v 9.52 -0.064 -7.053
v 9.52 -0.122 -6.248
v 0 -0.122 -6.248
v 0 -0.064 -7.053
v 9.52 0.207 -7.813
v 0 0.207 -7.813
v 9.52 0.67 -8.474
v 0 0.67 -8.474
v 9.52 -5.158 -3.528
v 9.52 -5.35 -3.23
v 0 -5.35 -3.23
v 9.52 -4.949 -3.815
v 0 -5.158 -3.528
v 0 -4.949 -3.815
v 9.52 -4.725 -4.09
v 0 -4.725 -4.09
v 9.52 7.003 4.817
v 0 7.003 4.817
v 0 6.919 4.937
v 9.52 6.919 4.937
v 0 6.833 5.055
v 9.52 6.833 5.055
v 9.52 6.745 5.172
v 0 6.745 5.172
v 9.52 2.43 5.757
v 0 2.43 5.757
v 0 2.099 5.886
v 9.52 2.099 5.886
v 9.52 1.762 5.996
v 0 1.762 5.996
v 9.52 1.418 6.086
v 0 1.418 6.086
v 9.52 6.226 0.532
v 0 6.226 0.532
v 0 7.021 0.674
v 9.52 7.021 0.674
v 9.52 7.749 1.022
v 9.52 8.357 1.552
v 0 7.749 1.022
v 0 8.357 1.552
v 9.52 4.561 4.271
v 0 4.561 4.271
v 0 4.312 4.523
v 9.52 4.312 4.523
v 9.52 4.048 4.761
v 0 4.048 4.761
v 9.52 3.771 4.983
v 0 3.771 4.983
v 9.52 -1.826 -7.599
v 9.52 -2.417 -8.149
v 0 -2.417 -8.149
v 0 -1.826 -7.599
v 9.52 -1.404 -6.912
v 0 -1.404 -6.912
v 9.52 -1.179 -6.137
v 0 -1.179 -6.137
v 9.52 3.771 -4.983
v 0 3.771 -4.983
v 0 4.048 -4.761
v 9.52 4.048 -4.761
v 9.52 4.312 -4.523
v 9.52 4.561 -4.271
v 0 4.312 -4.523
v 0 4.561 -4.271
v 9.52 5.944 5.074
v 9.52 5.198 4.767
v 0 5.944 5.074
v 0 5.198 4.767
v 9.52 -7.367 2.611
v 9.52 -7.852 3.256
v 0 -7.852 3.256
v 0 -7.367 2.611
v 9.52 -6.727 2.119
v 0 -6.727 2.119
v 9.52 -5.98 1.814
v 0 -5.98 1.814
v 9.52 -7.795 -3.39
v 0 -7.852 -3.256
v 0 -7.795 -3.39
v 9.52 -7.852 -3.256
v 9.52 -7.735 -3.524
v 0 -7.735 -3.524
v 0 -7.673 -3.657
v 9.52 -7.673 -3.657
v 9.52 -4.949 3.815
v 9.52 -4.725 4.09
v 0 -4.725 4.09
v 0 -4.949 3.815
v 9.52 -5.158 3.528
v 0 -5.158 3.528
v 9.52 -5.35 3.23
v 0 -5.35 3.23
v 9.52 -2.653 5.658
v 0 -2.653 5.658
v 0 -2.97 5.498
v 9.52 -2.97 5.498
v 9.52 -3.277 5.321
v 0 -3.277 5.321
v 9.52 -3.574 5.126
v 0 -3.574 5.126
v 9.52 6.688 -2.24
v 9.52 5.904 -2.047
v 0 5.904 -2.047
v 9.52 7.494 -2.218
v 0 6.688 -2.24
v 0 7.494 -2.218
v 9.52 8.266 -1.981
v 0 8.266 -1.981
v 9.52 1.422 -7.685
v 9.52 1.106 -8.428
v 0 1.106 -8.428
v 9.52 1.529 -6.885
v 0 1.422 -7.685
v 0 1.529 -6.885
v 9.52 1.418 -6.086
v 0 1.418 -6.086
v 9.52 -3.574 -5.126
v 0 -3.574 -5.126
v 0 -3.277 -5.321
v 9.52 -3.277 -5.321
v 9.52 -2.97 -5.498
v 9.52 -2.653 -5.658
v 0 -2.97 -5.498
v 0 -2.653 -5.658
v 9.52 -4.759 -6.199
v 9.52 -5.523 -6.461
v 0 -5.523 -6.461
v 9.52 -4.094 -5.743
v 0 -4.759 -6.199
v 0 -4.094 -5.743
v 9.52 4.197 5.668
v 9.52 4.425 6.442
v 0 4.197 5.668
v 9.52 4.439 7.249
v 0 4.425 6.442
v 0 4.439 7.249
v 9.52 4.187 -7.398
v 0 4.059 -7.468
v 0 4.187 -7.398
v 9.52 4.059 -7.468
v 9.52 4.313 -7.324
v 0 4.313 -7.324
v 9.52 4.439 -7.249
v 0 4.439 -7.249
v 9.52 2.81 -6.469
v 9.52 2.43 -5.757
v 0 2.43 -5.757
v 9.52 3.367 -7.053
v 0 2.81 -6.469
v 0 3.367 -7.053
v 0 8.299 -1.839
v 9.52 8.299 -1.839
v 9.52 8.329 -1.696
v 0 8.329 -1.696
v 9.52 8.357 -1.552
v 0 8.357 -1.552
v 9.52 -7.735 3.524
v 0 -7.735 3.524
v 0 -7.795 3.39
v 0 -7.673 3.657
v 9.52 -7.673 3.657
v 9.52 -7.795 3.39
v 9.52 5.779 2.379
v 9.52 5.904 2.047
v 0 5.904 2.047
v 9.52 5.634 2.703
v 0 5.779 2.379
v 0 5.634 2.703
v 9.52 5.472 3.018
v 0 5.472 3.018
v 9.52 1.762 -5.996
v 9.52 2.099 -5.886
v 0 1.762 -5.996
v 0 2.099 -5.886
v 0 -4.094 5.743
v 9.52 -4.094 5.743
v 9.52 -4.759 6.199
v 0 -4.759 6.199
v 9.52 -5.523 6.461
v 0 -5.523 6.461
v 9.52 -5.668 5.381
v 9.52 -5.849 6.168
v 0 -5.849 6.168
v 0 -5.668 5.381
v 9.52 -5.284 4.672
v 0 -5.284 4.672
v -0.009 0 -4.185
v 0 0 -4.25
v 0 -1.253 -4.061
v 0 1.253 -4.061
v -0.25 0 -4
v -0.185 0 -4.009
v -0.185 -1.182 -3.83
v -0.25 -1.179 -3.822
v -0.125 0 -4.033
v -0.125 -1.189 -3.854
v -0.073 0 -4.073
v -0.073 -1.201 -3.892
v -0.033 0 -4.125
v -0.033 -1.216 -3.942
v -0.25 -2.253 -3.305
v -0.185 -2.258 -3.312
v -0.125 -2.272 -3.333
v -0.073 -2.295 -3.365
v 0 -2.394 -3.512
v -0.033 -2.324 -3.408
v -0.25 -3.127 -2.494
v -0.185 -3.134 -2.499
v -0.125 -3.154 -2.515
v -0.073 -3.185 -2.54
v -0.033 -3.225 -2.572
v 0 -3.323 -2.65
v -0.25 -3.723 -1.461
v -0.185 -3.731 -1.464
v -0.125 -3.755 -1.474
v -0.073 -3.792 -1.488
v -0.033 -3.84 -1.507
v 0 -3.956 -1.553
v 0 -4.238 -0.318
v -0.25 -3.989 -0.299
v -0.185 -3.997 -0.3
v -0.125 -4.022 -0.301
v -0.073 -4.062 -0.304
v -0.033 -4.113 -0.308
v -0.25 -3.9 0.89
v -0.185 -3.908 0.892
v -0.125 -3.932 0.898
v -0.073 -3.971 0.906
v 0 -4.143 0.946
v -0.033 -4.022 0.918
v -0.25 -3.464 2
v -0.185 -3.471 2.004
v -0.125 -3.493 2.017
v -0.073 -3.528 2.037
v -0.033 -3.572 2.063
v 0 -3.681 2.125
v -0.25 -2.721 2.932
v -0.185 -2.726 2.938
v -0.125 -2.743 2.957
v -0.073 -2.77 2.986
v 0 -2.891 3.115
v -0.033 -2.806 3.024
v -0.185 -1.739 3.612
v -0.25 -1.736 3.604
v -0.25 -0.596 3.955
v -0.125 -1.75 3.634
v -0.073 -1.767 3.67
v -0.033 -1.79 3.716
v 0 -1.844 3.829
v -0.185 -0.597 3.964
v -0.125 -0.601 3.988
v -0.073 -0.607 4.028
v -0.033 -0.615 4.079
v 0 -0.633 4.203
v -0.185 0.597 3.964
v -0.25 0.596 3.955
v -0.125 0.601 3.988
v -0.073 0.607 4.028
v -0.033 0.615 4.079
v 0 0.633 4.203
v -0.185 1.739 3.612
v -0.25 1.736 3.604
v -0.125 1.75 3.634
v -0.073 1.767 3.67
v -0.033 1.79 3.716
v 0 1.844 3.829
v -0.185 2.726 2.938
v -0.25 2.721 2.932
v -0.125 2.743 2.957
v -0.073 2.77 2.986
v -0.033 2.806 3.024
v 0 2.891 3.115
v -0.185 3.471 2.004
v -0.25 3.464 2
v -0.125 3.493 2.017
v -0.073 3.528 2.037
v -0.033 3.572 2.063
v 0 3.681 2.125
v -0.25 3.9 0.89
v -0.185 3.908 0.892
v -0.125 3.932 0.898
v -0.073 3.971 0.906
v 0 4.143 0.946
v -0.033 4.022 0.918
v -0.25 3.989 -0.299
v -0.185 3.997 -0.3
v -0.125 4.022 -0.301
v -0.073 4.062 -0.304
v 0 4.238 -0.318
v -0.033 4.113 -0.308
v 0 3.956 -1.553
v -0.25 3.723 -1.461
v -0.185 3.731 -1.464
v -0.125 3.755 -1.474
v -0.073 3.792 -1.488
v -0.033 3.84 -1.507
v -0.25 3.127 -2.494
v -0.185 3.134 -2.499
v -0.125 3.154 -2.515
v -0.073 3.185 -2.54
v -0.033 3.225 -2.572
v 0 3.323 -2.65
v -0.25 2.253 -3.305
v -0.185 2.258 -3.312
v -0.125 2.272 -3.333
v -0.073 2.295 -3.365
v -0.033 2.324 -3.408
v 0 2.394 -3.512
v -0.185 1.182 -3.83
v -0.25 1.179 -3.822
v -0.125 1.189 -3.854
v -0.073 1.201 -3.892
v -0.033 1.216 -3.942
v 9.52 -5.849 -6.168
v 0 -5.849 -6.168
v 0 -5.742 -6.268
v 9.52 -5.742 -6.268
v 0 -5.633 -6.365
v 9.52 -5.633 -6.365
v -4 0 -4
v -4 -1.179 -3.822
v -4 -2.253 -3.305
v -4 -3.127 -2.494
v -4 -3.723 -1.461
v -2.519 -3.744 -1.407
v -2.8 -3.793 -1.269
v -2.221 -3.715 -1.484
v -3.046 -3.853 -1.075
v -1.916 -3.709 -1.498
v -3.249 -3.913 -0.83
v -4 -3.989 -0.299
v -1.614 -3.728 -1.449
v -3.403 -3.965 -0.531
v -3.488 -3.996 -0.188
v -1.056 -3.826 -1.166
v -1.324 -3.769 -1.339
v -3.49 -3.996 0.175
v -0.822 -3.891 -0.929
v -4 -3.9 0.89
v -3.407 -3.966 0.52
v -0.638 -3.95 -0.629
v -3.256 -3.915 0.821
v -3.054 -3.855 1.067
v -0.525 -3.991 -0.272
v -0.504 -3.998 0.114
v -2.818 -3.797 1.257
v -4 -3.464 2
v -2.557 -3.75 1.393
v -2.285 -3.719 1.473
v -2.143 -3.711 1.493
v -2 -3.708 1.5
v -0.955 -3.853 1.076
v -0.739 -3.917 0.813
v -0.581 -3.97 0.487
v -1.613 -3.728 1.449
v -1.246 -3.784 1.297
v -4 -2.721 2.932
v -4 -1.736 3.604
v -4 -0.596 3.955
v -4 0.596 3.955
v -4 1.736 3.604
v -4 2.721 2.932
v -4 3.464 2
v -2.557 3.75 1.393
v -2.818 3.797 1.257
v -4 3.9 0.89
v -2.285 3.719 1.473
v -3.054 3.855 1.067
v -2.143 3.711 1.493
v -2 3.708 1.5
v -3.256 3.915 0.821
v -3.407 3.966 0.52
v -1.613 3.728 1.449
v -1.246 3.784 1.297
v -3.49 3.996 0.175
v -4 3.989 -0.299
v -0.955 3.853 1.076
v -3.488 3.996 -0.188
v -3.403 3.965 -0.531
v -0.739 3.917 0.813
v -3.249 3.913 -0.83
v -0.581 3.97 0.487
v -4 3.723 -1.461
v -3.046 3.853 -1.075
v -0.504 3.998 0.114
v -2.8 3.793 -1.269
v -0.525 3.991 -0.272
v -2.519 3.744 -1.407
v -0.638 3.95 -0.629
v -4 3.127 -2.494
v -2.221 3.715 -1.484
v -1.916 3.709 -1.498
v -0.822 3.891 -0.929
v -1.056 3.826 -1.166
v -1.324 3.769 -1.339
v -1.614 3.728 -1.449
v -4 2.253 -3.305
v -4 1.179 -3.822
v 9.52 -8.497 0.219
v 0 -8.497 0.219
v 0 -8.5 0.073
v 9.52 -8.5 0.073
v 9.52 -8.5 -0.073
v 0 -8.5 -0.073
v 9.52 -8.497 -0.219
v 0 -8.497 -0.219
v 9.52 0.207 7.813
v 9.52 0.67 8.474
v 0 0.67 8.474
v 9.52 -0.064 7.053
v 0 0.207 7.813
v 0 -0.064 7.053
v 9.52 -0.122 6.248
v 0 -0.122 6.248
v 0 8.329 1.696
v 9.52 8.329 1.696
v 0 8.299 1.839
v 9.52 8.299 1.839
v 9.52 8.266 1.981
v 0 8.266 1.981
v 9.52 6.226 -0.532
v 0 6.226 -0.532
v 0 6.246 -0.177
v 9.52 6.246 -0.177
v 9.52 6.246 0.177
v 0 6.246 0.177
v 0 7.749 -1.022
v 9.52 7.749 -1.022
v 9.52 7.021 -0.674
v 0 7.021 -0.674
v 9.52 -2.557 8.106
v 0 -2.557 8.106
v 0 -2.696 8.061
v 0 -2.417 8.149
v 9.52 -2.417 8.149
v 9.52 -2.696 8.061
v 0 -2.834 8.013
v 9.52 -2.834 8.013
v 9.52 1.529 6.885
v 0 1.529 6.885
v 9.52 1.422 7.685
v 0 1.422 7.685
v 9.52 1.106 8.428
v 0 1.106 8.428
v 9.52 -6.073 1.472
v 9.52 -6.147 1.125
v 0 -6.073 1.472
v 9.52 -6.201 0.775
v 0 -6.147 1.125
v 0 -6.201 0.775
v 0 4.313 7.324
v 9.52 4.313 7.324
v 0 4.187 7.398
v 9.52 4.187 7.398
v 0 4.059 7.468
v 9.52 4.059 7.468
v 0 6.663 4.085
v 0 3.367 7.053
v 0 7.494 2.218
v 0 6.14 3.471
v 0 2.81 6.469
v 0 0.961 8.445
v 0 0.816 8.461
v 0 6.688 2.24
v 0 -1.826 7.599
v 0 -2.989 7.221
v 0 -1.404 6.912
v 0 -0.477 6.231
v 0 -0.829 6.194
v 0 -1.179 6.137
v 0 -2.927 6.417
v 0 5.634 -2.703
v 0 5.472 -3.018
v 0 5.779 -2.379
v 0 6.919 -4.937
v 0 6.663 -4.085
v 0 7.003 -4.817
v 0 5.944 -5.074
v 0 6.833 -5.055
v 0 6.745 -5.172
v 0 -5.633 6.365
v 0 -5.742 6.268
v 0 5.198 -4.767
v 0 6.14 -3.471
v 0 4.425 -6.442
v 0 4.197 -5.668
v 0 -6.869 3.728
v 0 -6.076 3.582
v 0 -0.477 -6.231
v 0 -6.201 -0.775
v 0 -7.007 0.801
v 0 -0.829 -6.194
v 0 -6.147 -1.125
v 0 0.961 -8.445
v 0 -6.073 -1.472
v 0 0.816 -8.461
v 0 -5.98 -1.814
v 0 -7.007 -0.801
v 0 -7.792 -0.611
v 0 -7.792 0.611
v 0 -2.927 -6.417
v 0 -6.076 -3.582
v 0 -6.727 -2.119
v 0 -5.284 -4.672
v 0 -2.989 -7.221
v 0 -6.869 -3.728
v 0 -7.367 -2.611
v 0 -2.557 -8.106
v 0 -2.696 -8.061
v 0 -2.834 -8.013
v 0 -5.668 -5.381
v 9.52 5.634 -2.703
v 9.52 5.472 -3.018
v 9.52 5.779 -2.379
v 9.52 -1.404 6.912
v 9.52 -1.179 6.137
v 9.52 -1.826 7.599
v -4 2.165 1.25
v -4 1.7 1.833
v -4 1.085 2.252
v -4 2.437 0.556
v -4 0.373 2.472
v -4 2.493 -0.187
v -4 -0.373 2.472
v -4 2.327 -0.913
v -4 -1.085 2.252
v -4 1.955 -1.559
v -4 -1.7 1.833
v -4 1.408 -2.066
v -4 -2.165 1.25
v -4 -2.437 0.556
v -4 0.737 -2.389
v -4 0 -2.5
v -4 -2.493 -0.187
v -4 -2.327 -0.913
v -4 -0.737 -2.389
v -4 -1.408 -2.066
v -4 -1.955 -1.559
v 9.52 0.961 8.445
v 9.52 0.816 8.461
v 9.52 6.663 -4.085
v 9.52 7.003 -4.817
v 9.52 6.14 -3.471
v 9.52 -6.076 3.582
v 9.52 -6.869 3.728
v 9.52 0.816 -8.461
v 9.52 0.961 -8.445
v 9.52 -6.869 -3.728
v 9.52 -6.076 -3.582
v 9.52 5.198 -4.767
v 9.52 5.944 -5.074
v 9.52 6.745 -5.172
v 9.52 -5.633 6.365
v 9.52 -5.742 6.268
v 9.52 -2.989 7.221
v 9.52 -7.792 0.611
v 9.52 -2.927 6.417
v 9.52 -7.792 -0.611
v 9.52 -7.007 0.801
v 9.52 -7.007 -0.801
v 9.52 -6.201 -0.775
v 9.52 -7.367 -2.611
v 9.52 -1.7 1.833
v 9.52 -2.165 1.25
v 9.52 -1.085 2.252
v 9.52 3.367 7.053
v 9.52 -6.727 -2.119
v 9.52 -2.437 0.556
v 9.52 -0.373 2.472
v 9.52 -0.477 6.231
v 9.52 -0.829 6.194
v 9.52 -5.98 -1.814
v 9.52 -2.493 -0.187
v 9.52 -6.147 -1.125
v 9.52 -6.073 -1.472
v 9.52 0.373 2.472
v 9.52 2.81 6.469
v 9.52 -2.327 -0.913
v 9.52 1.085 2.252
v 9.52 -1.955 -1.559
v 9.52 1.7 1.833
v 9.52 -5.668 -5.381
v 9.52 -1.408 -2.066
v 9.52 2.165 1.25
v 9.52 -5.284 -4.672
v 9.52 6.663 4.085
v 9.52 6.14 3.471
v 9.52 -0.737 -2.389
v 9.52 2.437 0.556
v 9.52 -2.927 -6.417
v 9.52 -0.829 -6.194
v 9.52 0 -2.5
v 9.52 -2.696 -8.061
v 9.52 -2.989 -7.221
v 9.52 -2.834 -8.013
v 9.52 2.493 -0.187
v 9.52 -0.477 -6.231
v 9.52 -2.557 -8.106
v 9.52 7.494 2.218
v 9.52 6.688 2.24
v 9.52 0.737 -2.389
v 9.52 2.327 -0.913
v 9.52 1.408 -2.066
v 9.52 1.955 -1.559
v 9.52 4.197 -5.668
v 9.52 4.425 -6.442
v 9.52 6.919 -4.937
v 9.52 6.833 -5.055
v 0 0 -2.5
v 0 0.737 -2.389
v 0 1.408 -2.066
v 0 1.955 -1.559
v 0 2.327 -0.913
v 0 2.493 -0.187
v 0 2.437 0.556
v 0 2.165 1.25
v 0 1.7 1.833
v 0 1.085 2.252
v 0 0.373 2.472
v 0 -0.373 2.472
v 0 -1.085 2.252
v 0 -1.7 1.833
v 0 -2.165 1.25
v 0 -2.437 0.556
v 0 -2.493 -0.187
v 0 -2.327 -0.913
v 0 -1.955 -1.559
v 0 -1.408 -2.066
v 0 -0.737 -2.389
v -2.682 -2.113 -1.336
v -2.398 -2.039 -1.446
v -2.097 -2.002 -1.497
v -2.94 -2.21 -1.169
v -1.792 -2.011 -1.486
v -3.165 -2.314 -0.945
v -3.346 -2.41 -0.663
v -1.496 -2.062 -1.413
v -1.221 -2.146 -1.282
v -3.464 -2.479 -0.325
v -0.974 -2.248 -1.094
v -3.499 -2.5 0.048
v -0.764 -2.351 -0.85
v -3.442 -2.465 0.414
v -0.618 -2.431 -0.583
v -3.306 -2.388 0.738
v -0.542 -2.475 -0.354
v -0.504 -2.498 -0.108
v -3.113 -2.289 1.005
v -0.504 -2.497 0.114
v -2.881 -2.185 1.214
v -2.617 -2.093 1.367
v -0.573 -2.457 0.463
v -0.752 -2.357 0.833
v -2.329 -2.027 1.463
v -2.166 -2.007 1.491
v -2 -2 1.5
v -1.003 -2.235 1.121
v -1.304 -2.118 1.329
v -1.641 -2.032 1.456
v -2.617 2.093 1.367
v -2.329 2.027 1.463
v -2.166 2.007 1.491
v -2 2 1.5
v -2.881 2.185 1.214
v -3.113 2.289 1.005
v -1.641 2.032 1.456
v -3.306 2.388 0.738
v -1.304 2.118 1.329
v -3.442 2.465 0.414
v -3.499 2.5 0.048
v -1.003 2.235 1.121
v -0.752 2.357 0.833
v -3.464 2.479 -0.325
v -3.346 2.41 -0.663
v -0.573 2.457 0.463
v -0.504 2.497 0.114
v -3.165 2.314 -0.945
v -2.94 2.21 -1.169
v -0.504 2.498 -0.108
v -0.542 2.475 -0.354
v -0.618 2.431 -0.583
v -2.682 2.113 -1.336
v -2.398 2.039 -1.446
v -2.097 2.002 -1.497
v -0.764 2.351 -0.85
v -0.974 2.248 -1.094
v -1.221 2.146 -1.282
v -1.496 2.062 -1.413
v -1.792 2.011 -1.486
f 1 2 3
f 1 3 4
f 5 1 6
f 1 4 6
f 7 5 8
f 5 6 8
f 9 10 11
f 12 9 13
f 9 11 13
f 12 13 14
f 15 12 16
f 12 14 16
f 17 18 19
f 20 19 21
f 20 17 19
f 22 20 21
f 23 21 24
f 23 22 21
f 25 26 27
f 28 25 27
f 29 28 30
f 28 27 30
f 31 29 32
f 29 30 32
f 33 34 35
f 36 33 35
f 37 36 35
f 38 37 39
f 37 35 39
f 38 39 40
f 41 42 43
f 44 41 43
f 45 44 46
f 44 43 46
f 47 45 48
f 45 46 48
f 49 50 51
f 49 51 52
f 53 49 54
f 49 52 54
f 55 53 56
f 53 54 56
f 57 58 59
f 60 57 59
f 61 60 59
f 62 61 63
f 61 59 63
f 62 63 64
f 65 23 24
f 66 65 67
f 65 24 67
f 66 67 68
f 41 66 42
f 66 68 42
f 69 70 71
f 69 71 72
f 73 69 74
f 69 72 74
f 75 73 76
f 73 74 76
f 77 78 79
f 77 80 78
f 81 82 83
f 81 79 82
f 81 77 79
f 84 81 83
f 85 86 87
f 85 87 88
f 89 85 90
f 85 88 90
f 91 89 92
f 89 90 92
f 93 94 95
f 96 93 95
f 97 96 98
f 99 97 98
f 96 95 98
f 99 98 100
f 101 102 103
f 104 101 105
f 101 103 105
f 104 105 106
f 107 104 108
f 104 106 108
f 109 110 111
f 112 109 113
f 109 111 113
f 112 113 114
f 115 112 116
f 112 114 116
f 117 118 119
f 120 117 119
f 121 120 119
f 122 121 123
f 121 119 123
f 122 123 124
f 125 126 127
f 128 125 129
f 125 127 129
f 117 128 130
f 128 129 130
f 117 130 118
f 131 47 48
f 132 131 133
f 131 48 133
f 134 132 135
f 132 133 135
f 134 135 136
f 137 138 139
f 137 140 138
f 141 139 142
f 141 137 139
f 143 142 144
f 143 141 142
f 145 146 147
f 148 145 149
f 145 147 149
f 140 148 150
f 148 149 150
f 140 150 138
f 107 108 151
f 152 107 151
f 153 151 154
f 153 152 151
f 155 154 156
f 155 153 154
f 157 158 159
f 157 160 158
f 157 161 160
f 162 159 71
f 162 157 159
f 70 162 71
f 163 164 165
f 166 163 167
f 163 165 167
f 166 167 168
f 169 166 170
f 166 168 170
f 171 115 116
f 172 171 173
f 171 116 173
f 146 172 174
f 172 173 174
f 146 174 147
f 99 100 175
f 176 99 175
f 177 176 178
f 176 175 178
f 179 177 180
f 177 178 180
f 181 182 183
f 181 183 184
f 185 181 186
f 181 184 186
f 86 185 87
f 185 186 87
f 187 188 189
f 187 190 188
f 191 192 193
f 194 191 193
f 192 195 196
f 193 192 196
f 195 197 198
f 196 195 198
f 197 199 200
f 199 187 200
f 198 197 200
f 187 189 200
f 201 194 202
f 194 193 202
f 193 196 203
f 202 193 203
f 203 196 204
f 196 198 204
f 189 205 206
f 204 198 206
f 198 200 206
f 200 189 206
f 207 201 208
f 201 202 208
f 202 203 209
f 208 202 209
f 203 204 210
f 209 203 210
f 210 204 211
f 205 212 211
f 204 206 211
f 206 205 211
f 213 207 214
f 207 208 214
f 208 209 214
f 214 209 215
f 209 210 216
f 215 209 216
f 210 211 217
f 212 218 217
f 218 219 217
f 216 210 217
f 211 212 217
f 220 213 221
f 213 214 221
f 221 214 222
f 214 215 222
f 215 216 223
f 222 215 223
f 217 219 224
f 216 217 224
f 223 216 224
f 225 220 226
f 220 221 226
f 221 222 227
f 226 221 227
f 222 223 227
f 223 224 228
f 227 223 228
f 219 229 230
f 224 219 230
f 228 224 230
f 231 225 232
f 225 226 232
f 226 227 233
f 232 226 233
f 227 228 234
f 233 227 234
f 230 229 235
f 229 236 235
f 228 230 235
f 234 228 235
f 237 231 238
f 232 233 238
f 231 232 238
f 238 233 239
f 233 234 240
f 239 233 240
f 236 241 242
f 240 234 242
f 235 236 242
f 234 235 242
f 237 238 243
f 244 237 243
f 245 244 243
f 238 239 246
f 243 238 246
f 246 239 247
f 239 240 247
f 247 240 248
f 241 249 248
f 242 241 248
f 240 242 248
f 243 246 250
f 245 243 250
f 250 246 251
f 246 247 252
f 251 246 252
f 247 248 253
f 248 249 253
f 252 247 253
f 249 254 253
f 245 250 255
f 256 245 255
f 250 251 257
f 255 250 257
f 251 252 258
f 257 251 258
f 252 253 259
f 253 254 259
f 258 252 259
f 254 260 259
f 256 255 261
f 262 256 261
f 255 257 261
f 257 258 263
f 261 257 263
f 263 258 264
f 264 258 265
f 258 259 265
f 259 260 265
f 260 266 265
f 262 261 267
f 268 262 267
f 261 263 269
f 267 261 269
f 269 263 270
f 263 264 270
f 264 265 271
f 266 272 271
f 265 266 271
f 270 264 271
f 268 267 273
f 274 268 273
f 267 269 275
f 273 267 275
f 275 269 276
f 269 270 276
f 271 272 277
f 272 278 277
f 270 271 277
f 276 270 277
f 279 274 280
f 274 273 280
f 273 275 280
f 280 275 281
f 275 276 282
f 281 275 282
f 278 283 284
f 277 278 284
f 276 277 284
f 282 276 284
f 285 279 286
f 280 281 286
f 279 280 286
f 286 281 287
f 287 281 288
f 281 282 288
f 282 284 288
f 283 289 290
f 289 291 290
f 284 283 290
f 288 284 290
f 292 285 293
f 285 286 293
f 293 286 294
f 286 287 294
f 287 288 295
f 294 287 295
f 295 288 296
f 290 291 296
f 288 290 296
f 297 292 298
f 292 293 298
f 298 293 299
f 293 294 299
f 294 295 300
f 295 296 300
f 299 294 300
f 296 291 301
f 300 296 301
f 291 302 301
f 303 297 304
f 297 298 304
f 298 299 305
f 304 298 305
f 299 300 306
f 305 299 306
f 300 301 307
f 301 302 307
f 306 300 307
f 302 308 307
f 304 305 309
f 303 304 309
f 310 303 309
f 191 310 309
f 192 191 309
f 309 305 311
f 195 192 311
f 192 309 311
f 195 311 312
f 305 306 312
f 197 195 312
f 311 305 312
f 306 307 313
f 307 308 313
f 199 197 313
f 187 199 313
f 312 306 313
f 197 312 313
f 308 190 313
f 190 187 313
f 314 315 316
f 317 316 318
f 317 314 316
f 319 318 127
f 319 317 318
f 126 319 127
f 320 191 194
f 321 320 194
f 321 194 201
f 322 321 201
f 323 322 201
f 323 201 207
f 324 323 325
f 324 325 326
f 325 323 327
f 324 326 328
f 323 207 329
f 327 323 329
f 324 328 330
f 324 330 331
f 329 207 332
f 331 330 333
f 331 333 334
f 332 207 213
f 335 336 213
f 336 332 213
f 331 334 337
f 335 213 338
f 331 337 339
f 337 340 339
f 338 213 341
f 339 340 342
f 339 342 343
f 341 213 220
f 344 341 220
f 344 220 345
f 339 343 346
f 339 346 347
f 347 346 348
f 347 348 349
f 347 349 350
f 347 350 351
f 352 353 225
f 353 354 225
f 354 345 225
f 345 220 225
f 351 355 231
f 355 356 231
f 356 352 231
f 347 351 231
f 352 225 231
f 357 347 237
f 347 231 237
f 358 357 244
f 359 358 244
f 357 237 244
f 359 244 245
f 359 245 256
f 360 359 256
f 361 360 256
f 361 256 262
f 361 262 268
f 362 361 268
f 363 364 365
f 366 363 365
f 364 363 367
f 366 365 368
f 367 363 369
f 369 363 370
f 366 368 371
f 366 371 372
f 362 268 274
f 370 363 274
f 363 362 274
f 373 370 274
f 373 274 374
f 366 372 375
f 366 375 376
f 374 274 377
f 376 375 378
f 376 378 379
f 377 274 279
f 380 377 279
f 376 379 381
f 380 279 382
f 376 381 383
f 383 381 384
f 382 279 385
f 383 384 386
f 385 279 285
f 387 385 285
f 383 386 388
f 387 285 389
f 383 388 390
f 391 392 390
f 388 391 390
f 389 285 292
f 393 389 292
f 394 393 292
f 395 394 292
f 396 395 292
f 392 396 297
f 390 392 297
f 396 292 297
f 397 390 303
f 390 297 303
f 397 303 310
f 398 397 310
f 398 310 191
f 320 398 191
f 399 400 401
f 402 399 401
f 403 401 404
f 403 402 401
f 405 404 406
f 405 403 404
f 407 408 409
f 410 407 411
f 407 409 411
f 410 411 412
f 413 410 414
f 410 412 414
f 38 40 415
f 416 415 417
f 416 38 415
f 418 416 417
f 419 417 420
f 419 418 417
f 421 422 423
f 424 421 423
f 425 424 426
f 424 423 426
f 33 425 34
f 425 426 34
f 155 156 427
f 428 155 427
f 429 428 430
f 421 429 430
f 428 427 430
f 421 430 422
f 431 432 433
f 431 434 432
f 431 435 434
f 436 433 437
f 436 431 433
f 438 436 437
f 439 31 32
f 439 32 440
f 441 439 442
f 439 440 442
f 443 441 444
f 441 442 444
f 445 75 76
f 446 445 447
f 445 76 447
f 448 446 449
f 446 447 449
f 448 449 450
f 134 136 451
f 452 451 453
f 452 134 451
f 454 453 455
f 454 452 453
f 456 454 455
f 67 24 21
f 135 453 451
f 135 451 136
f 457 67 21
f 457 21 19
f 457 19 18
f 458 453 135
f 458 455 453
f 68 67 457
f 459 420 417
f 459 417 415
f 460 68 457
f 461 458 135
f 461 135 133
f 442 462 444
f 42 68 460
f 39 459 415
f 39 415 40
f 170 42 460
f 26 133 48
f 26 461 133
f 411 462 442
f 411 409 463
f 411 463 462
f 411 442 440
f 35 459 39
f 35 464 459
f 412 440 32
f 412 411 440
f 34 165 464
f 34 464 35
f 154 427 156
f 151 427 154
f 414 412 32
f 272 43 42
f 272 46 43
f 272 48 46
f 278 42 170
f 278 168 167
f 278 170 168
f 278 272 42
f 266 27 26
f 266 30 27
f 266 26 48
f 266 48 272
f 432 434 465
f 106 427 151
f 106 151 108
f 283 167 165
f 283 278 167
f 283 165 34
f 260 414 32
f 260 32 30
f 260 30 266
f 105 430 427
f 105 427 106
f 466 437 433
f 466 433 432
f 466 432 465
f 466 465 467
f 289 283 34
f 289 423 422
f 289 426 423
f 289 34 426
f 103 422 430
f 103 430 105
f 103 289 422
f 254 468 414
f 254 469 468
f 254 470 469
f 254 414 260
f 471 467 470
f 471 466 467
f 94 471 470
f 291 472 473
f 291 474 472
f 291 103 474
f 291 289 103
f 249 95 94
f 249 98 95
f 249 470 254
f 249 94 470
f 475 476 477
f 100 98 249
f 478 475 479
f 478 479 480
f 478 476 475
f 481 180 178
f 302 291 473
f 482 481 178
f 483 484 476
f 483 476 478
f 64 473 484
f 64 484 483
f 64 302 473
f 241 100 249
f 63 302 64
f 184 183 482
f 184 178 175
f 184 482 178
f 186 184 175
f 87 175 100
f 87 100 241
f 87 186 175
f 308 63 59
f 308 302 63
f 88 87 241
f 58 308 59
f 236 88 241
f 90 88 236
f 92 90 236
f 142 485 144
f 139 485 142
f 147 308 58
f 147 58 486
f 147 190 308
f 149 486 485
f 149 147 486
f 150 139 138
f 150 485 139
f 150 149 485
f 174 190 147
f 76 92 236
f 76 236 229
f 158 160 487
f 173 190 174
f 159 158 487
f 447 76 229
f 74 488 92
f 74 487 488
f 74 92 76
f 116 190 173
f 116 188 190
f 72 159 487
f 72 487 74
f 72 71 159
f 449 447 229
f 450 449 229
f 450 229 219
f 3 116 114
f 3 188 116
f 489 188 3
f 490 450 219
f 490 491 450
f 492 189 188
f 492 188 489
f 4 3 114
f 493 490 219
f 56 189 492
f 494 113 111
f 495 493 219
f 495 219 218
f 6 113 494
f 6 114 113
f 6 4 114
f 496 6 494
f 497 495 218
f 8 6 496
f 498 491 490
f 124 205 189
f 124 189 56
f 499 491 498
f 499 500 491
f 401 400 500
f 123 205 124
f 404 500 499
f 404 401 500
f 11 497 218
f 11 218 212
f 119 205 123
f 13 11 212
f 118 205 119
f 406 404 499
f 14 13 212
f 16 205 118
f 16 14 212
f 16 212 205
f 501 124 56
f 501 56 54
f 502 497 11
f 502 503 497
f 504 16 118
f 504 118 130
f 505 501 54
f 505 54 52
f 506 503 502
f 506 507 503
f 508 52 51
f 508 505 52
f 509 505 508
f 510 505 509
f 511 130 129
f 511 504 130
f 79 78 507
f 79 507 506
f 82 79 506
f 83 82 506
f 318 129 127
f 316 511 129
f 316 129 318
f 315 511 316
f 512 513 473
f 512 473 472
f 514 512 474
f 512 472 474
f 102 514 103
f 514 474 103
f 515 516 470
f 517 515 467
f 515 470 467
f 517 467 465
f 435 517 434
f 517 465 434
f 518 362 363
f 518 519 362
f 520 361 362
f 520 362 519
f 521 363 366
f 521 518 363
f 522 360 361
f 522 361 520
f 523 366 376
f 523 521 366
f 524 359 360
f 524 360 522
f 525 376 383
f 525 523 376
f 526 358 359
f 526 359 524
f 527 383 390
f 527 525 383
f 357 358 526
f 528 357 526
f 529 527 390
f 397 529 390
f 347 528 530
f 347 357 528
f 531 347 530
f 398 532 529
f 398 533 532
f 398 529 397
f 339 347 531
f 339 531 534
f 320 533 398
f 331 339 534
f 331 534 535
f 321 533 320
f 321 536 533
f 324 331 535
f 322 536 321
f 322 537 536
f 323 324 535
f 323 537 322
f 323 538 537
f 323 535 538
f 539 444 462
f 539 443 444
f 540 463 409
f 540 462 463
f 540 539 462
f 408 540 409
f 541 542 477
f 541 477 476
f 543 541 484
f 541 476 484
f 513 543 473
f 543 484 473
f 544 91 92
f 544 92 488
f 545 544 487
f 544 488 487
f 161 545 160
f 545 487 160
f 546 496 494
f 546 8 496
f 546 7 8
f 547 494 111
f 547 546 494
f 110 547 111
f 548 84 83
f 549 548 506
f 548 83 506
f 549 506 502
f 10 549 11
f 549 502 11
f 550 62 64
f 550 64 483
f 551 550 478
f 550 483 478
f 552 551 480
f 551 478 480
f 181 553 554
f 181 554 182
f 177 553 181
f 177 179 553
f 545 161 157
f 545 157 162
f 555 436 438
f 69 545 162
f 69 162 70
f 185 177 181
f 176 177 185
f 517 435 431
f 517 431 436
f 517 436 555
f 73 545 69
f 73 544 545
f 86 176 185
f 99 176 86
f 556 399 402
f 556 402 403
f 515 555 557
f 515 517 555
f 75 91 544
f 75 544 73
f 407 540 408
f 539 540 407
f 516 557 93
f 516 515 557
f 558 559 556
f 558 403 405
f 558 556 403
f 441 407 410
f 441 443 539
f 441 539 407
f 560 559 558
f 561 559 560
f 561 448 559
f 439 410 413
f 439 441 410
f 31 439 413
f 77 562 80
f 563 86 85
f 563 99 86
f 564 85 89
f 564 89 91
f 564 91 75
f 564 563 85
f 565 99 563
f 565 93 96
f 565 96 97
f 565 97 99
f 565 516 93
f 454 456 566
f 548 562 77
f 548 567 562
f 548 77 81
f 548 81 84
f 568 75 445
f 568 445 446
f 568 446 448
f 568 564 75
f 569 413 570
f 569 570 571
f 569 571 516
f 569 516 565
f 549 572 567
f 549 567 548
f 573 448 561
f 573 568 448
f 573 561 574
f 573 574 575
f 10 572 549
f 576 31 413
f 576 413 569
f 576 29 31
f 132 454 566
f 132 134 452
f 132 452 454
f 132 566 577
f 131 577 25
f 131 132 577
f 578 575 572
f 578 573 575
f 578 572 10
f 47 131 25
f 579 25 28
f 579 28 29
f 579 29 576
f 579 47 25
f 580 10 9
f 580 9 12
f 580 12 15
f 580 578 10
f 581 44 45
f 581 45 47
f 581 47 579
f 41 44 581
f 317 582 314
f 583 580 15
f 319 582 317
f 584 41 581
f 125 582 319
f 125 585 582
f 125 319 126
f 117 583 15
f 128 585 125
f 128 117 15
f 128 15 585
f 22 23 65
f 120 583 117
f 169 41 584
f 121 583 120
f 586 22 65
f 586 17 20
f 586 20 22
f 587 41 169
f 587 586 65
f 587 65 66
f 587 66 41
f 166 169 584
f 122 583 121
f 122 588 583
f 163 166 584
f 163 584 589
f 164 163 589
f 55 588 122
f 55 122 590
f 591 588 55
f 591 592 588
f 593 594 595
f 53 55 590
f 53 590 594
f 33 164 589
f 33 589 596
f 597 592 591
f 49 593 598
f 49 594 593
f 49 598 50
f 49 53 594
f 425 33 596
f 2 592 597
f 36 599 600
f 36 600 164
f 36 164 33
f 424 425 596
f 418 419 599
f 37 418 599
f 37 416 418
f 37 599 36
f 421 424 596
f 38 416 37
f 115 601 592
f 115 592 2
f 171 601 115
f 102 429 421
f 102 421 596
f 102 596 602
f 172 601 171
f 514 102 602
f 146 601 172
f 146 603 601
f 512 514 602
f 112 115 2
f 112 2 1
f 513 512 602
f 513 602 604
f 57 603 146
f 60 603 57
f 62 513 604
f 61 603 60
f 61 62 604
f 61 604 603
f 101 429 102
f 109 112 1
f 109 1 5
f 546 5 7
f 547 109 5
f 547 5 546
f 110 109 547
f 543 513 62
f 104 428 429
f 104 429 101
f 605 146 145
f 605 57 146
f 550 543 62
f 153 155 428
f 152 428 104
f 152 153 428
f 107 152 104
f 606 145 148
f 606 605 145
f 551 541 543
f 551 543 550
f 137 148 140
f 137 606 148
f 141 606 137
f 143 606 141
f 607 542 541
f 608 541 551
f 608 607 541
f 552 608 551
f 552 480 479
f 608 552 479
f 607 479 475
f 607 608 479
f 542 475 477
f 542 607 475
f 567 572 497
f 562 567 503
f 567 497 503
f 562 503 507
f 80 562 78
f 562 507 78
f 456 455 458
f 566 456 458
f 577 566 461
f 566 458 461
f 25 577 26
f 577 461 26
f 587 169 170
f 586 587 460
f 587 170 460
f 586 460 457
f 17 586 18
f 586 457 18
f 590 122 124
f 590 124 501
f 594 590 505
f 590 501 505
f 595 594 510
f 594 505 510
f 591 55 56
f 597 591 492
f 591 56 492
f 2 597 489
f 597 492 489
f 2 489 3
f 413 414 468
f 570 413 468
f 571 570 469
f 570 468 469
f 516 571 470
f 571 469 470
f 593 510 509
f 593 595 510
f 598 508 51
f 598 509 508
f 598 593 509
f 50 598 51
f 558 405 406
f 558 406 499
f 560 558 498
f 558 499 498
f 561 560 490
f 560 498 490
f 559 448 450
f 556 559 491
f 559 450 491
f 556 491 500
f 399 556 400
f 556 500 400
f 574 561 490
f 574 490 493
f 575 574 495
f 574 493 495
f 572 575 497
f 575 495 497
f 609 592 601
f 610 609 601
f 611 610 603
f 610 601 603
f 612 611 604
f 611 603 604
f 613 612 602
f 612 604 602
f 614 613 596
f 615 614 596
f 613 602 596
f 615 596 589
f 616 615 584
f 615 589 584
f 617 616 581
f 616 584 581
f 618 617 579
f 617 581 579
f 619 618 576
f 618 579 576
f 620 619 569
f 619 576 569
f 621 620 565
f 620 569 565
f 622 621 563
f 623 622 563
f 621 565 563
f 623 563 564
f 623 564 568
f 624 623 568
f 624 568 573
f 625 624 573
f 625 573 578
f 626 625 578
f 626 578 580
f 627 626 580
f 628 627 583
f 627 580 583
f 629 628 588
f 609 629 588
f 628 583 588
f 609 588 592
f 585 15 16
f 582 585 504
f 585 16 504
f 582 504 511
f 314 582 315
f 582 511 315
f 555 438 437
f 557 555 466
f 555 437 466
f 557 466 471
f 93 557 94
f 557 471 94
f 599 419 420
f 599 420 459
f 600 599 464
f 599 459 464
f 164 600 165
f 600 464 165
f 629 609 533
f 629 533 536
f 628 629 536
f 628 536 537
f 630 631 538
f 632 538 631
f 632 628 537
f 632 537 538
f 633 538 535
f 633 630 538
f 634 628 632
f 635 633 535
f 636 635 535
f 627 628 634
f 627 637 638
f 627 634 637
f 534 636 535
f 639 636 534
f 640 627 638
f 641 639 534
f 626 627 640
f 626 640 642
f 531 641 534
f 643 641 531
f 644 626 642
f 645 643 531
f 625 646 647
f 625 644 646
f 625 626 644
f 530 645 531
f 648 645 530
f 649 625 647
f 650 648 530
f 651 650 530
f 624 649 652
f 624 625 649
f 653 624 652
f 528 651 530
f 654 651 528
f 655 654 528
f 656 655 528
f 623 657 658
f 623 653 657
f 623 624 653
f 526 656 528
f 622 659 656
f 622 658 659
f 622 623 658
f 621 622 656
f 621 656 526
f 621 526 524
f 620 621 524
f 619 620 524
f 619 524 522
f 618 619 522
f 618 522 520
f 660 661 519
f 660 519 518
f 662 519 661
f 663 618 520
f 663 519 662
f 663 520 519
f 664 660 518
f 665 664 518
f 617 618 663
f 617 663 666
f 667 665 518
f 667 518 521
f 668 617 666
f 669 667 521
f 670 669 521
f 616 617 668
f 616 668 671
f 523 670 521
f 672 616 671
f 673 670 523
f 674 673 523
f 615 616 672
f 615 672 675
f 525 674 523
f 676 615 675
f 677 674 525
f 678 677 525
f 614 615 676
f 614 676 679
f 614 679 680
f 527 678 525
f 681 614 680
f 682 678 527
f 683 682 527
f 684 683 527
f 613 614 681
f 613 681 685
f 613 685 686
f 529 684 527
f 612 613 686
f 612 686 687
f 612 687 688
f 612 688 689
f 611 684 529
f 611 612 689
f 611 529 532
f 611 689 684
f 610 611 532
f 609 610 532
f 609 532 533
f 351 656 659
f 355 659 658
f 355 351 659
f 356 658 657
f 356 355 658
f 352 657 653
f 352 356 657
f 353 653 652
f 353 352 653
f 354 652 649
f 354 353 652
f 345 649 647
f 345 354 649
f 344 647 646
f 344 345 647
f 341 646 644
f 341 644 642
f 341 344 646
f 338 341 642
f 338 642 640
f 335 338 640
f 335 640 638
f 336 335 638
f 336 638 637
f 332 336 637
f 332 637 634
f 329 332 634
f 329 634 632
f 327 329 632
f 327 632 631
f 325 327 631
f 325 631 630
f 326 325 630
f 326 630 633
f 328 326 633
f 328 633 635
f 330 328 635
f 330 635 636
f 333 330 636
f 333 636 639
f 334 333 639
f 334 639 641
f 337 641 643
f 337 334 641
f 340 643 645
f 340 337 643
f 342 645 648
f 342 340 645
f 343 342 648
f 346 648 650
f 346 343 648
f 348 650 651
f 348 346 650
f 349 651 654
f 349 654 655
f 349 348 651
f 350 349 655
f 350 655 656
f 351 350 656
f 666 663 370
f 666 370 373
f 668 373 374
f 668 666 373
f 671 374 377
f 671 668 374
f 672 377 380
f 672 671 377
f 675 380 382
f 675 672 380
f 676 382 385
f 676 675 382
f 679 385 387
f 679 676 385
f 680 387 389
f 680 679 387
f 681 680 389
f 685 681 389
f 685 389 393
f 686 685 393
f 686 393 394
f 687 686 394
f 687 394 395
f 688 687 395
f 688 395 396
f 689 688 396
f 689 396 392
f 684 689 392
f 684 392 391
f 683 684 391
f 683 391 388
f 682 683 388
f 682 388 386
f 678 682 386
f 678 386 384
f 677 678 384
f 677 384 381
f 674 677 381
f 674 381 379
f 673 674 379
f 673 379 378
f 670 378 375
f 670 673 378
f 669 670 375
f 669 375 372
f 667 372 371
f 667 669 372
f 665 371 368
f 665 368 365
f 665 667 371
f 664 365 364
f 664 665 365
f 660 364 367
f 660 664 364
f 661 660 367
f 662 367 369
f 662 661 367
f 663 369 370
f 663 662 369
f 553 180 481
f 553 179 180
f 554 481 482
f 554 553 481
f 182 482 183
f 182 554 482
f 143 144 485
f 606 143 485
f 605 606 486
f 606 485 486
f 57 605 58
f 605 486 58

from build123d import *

# Parameters (mm, degrees)
BASPROSKE_W                = 12.7
BASPROSKE_H                = 8.5
TOOTHCUT_DEPTH             = 18.486852204
TEETHCUTS_COUNT            = 15
TEETHCUTS_ANGLE            = 336
BORSKE_R                   = 0.4
BORE_DEPTH                 = 50.0000508
CORTAR_EXTRUIR1_START      = -3.18
CORTAR_EXTRUIR1_DEPTH      = 3.18
CROQUIS4_R                 = 2.5
CORTAR_EXTRUIR2_DEPTH      = 9.52
CROQUIS5_R                 = 4
CROQUIS5_R_2               = 2.5
SALIENTE_EXTRUIR1_DEPTH    = 4
CORTAR_EXTRUIR3_DEPTH      = 16.319316842
CORTAR_EXTRUIR3_DEPTH_BACK = 16.319316842
CROQUIS6_R                 = 1.5
REDONDEO2_R                = 0.25


with BuildPart() as part:
    # BasProSke → Base-Revolve (revolve)
    with BuildSketch(Plane(origin=(0, 0, 0), x_dir=(1, 0, 0), z_dir=(0, 1, 0)), mode=Mode.PRIVATE) as base_revolve_sk:
        with Locations((6.35, 4.25)):
            Rectangle(BASPROSKE_W, BASPROSKE_H)
    revolve(base_revolve_sk.sketch.rotate(Axis((-10, 0, 0), (1, 0, 0)), 180), axis=Axis((-10, 0, 0), (1, 0, 0)))

    # TooCutSke → ToothCut (cut, through all)
    with BuildSketch(Plane(origin=(0, 0, 0), x_dir=(0, 0, -1), z_dir=(1, 0, 0))):
        with BuildLine():
            ThreePointArc((0.531576138, 6.226349477), (0, 6.249), (-0.531576138, 6.226349477))
            ThreePointArc((-0.531576138, 6.226349477), (-0.830301624, 7.411024729), (-1.576608494, 8.378350125))
            ThreePointArc((-1.576608494, 8.378350125), (0, 8.5254), (1.576608494, 8.378350125))
            ThreePointArc((1.576608494, 8.378350125), (0.830301624, 7.411024729), (0.531576138, 6.226349477))
        make_face()
    toothcut = extrude(amount=TOOTHCUT_DEPTH, mode=Mode.SUBTRACT)

    # TeethCuts: ToothCut ×15 about axis
    teethcuts_axis = Axis((-10, 0, 0), (1, 0, 0))
    for i in range(1, TEETHCUTS_COUNT):
        add(toothcut.rotate(teethcuts_axis, i * TEETHCUTS_ANGLE / (TEETHCUTS_COUNT - 1)), mode=Mode.SUBTRACT)

    # BorSke → Bore (cut, symmetric)
    with BuildSketch(Plane(origin=(0, 0, 0), x_dir=(0, 0, -1), z_dir=(1, 0, 0))):
        with Locations(Location((0, 0, 0), (0, 0, 180))):
            Circle(BORSKE_R)
    extrude(amount=BORE_DEPTH, both=True, mode=Mode.SUBTRACT)

    # Croquis2 → Cortar-Extruir1 (cut)
    with BuildSketch(Plane(origin=(12.7, 0, 0), x_dir=(0, 0, -1), z_dir=(1, 0, 0)).offset(CORTAR_EXTRUIR1_START)):
        with BuildLine():
            ThreePointArc((-8.473551116, 0.670023493), (-7.441942771, 0.04560728), (-6.24780572, -0.122166634))
            ThreePointArc((-6.24780572, -0.122166634), (-6.214767324, -0.653198367), (-6.136676046, -1.179494851))
            ThreePointArc((-6.136676046, -1.179494851), (-7.26983618, -1.591877556), (-8.149077977, -2.417132211))
            ThreePointArc((-8.149077977, -2.417132211), (-8.083980389, -2.626644452), (-8.013497238, -2.834406818))
            ThreePointArc((-8.013497238, -2.834406818), (-6.817103167, -2.985246497), (-5.657964889, -2.652816299))
            ThreePointArc((-5.657964889, -2.652816299), (-5.411792748, -3.1245), (-5.126388751, -3.573533178))
            ThreePointArc((-5.126388751, -3.573533178), (-5.993850886, -4.411161274), (-6.461416928, -5.522688773))
            ThreePointArc((-6.461416928, -5.522688773), (-6.316731017, -5.687610154), (-6.167836888, -5.84874244))
            ThreePointArc((-6.167836888, -5.84874244), (-5.013524493, -5.499924035), (-4.089810528, -4.724769925))
            ThreePointArc((-4.089810528, -4.724769925), (-3.673070042, -5.055547198), (-3.229702268, -5.349675154))
            ThreePointArc((-3.229702268, -5.349675154), (-3.681474322, -6.467715134), (-3.656518192, -7.673322273))
            ThreePointArc((-3.656518192, -7.673322273), (-3.457261466, -7.76513639), (-3.255701506, -7.851777359))
            ThreePointArc((-3.255701506, -7.851777359), (-2.343061889, -7.063614742), (-1.814490772, -5.979767908))
            ThreePointArc((-1.814490772, -5.979767908), (-1.299240156, -6.112444357), (-0.774570923, -6.200809696))
            ThreePointArc((-0.774570923, -6.200809696), (-0.732537403, -7.405942289), (-0.219374243, -8.497168643))
            ThreePointArc((-0.219374243, -8.497168643), (0, -8.5), (0.219374243, -8.497168643))
            ThreePointArc((0.219374243, -8.497168643), (0.732537403, -7.405942289), (0.774570923, -6.200809696))
            ThreePointArc((0.774570923, -6.200809696), (1.299240156, -6.112444357), (1.814490772, -5.979767908))
            ThreePointArc((1.814490772, -5.979767908), (2.343061889, -7.063614742), (3.255701506, -7.851777359))
            ThreePointArc((3.255701506, -7.851777359), (3.457261466, -7.76513639), (3.656518192, -7.673322273))
            ThreePointArc((3.656518192, -7.673322273), (3.681474322, -6.467715134), (3.229702268, -5.349675154))
            ThreePointArc((3.229702268, -5.349675154), (3.673070042, -5.055547198), (4.089810528, -4.724769925))
            ThreePointArc((4.089810528, -4.724769925), (5.013524493, -5.499924035), (6.167836888, -5.84874244))
            ThreePointArc((6.167836888, -5.84874244), (6.316731017, -5.687610154), (6.461416928, -5.522688773))
            ThreePointArc((6.461416928, -5.522688773), (5.993850886, -4.411161274), (5.126388751, -3.573533178))
            ThreePointArc((5.126388751, -3.573533178), (5.411792748, -3.1245), (5.657964889, -2.652816299))
            ThreePointArc((5.657964889, -2.652816299), (6.817103167, -2.985246497), (8.013497238, -2.834406818))
            ThreePointArc((8.013497238, -2.834406818), (8.083980389, -2.626644452), (8.149077977, -2.417132211))
            ThreePointArc((8.149077977, -2.417132211), (7.26983618, -1.591877556), (6.136676046, -1.179494851))
            ThreePointArc((6.136676046, -1.179494851), (6.214767324, -0.653198367), (6.24780572, -0.122166634))
            ThreePointArc((6.24780572, -0.122166634), (7.441942771, 0.04560728), (8.473551116, 0.670023493))
            ThreePointArc((8.473551116, 0.670023493), (8.453436111, 0.888491938), (8.427689411, 1.106368468))
            ThreePointArc((8.427689411, 1.106368468), (7.288800753, 1.502656253), (6.085876303, 1.418488851))
            ThreePointArc((6.085876303, 1.418488851), (5.94315217, 1.931047198), (5.757344182, 2.429606752))
            ThreePointArc((5.757344182, 2.429606752), (6.780002862, 3.068575145), (7.468451026, 4.058600654))
            ThreePointArc((7.468451026, 4.058600654), (7.361215932, 4.25), (7.249076783, 4.438567989))
            ThreePointArc((7.249076783, 4.438567989), (6.04746546, 4.337367144), (4.982773259, 3.771202944))
            ThreePointArc((4.982773259, 3.771202944), (4.643912014, 4.181397159), (4.271385532, 4.561279057))
            ThreePointArc((4.271385532, 4.561279057), (4.945738865, 5.560958489), (5.171987905, 6.745408891))
            ThreePointArc((5.171987905, 6.745408891), (4.996174644, 6.876644452), (4.817032924, 7.003298781))
            ThreePointArc((4.817032924, 7.003298781), (3.760468449, 6.422107853), (3.018103451, 5.471841788))
            ThreePointArc((3.018103451, 5.471841788), (2.541697283, 5.708745565), (2.046865518, 5.904264776))
            ThreePointArc((2.046865518, 5.904264776), (2.256311686, 7.091801591), (1.981241089, 8.265874651))
            ThreePointArc((1.981241089, 8.265874651), (1.767249372, 8.314254606), (1.55208031, 8.357095591))
            ThreePointArc((1.55208031, 8.357095591), (0.823252281, 7.396407771), (0.531576138, 6.226349477))
            ThreePointArc((0.531576138, 6.226349477), (0, 6.249), (-0.531576138, 6.226349477))
            ThreePointArc((-0.531576138, 6.226349477), (-0.823252281, 7.396407771), (-1.55208031, 8.357095591))
            ThreePointArc((-1.55208031, 8.357095591), (-1.767249372, 8.314254606), (-1.981241089, 8.265874651))
            ThreePointArc((-1.981241089, 8.265874651), (-2.256311686, 7.091801591), (-2.046865518, 5.904264776))
            ThreePointArc((-2.046865518, 5.904264776), (-2.541697283, 5.708745565), (-3.018103451, 5.471841788))
            ThreePointArc((-3.018103451, 5.471841788), (-3.760468449, 6.422107853), (-4.817032924, 7.003298781))
            ThreePointArc((-4.817032924, 7.003298781), (-4.996174644, 6.876644452), (-5.171987905, 6.745408891))
            ThreePointArc((-5.171987905, 6.745408891), (-4.945738865, 5.560958489), (-4.271385532, 4.561279057))
            ThreePointArc((-4.271385532, 4.561279057), (-4.643912014, 4.181397159), (-4.982773259, 3.771202944))
            ThreePointArc((-4.982773259, 3.771202944), (-6.04746546, 4.337367144), (-7.249076783, 4.438567989))
            ThreePointArc((-7.249076783, 4.438567989), (-7.361215932, 4.25), (-7.468451026, 4.058600654))
            ThreePointArc((-7.468451026, 4.058600654), (-6.780002862, 3.068575145), (-5.757344182, 2.429606752))
            ThreePointArc((-5.757344182, 2.429606752), (-5.94315217, 1.931047198), (-6.085876303, 1.418488851))
            ThreePointArc((-6.085876303, 1.418488851), (-7.288800753, 1.502656253), (-8.427689411, 1.106368468))
            ThreePointArc((-8.427689411, 1.106368468), (-8.453436111, 0.888491938), (-8.473551116, 0.670023493))
        make_face()
    extrude(amount=CORTAR_EXTRUIR1_DEPTH, mode=Mode.SUBTRACT)

    # Croquis4 → Cortar-Extruir2 (cut)
    with BuildSketch(Plane(origin=(9.52, 0, 0), x_dir=(0, 0, -1), z_dir=(1, 0, 0))):
        Circle(CROQUIS4_R)
    extrude(amount=-CORTAR_EXTRUIR2_DEPTH, mode=Mode.SUBTRACT)

    # Croquis5 → Saliente-Extruir1 (add)
    with BuildSketch(Plane.ZY):
        with Locations(Location((0, 0, 0), (0, 0, 180))):
            Circle(CROQUIS5_R)
        with Locations(Location((0, 0, 0), (0, 0, 180))):
            Circle(CROQUIS5_R_2, mode=Mode.SUBTRACT)
    extrude(amount=SALIENTE_EXTRUIR1_DEPTH)

    # Croquis6 → Cortar-Extruir3 (cut, two sides: drawn at the far end of the back side and taken through both)
    with BuildSketch(Plane(origin=(0, 0, 0), x_dir=(1, 0, 0), z_dir=(0, 1, 0)).offset(-CORTAR_EXTRUIR3_DEPTH_BACK)):
        with Locations(Location((-2, 0, 0), (0, 0, 270))):
            Circle(CROQUIS6_R)
    extrude(amount=CORTAR_EXTRUIR3_DEPTH + CORTAR_EXTRUIR3_DEPTH_BACK, mode=Mode.SUBTRACT)

    # Redondeo2
    redondeo2_edges = [part.edges().sort_by_distance(p)[0] for p in [
        (0, 0, 4),
    ]]
    fillet(redondeo2_edges, radius=REDONDEO2_R)


solid = part.part
